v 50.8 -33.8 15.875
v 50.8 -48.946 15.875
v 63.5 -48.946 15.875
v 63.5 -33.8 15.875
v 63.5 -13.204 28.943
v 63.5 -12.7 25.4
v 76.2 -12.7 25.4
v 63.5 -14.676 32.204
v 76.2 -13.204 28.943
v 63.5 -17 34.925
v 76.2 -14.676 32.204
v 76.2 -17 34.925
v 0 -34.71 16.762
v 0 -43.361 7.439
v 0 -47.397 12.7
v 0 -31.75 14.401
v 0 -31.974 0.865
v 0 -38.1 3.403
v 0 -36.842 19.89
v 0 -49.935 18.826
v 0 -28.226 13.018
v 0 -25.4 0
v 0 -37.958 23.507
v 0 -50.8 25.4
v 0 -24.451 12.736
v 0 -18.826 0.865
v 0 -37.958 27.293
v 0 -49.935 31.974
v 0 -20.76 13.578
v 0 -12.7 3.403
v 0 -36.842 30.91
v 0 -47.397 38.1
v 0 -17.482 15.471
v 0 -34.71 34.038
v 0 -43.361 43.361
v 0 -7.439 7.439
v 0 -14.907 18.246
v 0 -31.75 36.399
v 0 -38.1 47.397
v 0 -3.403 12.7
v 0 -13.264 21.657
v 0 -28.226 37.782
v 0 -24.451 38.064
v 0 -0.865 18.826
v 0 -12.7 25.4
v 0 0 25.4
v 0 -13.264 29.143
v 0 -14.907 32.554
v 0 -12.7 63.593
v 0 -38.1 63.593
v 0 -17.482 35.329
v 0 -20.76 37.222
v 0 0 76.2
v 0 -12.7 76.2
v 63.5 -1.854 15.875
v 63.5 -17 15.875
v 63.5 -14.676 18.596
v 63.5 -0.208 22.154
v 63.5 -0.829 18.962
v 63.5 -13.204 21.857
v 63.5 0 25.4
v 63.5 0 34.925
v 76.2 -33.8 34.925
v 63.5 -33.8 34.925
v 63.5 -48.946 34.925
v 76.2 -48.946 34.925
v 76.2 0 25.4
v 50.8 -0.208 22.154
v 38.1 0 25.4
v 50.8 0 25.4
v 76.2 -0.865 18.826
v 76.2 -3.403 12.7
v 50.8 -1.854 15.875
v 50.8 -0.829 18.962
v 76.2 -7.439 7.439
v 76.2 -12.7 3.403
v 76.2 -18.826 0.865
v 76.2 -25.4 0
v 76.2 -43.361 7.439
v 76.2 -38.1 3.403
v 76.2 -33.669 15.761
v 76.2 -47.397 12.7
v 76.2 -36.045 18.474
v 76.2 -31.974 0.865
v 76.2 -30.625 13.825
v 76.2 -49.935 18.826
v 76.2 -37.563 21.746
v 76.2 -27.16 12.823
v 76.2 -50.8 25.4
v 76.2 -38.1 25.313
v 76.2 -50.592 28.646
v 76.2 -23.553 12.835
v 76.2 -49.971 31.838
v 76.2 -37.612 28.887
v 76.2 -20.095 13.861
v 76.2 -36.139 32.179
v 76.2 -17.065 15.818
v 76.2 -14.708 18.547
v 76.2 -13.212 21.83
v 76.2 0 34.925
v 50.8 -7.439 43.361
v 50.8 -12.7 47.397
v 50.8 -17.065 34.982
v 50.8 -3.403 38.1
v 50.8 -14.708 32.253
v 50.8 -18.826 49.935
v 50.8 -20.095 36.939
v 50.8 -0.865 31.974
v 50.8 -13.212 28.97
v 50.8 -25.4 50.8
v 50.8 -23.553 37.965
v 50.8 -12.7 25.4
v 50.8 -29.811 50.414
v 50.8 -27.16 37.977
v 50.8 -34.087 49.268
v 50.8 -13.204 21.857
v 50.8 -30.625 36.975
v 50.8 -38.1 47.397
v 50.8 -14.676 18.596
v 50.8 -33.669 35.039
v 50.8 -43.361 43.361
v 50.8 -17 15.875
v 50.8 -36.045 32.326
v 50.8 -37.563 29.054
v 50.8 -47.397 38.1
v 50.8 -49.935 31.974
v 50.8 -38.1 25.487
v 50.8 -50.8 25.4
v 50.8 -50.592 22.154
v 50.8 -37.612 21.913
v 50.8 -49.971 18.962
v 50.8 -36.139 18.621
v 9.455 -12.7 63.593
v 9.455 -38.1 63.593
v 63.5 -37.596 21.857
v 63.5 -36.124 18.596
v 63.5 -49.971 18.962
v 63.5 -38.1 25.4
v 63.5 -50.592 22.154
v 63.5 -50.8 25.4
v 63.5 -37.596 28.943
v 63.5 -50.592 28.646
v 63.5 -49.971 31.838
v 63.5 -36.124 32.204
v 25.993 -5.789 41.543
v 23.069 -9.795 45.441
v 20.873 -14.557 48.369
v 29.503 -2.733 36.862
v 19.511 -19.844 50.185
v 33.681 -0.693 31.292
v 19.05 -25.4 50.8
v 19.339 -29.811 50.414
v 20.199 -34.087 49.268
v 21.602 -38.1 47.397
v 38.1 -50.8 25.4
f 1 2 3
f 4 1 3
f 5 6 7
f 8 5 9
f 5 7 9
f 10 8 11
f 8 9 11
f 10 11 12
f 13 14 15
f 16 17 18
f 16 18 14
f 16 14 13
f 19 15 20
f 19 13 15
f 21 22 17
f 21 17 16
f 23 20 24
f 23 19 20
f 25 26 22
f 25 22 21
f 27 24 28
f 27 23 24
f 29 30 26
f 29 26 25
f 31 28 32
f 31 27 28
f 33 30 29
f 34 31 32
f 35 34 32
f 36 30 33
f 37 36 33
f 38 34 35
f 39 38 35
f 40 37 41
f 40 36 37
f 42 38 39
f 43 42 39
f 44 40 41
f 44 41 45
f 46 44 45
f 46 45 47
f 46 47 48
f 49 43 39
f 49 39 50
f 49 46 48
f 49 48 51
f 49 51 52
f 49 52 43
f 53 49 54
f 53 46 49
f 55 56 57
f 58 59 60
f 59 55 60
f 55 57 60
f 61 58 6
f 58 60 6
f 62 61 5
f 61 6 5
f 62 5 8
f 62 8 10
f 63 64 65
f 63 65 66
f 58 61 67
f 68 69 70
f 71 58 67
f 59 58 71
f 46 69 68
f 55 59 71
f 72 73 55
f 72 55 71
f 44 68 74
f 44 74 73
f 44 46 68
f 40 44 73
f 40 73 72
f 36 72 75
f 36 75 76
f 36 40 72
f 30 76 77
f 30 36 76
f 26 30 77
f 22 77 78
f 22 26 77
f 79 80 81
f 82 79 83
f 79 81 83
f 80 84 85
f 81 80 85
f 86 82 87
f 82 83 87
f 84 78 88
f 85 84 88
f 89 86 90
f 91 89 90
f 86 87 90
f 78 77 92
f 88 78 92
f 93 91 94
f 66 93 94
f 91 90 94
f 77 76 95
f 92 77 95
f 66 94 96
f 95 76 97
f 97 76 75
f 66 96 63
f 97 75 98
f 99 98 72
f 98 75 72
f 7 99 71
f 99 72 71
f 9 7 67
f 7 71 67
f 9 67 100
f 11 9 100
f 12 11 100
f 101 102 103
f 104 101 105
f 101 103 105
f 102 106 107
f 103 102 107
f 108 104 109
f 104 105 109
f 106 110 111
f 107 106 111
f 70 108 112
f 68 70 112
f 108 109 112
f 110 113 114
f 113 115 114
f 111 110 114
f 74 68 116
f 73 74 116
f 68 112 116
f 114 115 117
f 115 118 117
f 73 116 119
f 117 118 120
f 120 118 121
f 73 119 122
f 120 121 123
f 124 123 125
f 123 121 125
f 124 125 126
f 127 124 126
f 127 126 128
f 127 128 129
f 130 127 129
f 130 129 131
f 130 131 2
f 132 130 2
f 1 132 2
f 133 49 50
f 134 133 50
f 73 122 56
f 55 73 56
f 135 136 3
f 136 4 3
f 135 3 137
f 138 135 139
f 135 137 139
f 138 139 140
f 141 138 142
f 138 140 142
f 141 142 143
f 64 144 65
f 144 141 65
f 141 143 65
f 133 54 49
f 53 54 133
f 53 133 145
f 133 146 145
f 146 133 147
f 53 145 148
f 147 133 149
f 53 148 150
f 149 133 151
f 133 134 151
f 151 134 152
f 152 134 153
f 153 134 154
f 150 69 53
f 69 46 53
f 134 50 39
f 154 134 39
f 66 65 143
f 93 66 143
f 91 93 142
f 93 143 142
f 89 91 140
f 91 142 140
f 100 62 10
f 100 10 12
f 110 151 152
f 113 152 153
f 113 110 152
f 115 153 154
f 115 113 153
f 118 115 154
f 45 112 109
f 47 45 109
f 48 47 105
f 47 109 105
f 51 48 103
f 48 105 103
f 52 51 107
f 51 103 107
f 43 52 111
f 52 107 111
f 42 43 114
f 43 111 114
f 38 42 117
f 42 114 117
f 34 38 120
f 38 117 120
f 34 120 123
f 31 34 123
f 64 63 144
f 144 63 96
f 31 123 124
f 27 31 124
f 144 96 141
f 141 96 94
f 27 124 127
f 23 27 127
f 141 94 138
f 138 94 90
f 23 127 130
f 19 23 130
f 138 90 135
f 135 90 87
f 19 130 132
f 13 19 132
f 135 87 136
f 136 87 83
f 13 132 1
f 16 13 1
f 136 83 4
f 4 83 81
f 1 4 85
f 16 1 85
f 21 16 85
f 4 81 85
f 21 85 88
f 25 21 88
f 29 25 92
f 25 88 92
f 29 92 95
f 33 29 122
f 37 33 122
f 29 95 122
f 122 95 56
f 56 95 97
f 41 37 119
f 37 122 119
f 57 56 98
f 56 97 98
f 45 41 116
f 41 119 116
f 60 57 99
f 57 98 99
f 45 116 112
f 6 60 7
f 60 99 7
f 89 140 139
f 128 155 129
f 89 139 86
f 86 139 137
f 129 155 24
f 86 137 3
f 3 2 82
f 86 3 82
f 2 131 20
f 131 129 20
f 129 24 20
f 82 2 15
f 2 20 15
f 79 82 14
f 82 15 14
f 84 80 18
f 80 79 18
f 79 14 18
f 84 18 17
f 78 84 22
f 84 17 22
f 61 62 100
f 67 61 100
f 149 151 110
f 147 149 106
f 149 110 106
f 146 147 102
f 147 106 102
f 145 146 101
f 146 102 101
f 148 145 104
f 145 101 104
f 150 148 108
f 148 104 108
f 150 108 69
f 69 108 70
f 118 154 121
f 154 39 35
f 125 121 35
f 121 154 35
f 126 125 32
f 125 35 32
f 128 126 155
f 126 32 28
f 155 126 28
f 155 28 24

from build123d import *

# Parameters (mm, degrees)
F0_W         = 76.2
F0_H         = 76.2
F1_DEPTH     = 50.8
F2_R         = 12.7
F3_DEPTH     = 76.201
F5_DEPTH     = 25.4
F6_DEPTH     = 50.801
F7_R         = 25.39999
F9_DEPTH     = 25.4
F10_DEPTH    = 76.201
F11_T1_DEPTH = 203.2


# Not quite as in the source:
# - a fillet or chamfer that OpenCascade refuses, or shapes differently, is made with other operations: its cross-section is extruded or revolved along the edge and cut away or added
# - a fillet or chamfer is up to 0.001 mm smaller than in the source, because OpenCascade refuses the exact size


with BuildPart() as f1:
    # F0 (on Front) → F1 (new body)
    with BuildSketch(Plane.XZ):
        with Locations((38.1, 38.1)):
            Rectangle(F0_W, F0_H)
    extrude(amount=F1_DEPTH)

    # F2 (on face) → F3 (cut, through all)
    with BuildSketch(Plane.YZ.offset(76.2)):
        with Locations((-25.4, 25.4)):
            Circle(F2_R)
    extrude(amount=-F3_DEPTH, mode=Mode.SUBTRACT)

    # F4 (on face) → F5 (cut)
    with BuildSketch(Plane.XZ.offset(50.8)):
        Polygon((63.5, 34.925), (76.2, 34.925), (76.2, 76.2), (0, 76.2), (19.05, 50.8), (50.8, 50.8), (50.8, 15.875), (63.5, 15.875), align=None)
    extrude(amount=-F5_DEPTH, mode=Mode.SUBTRACT)

    # F4 (on face) → F6 (cut, through all)
    with BuildSketch(Plane.XZ.offset(50.8)):
        Polygon((63.5, 34.925), (76.2, 34.925), (76.2, 76.2), (0, 76.2), (19.05, 50.8), (50.8, 50.8), (50.8, 15.875), (63.5, 15.875), align=None)
    extrude(amount=-F6_DEPTH, mode=Mode.SUBTRACT)

    # F7 (radius 25.4 in the source; OpenCascade refuses exactly that, so slightly less here)
    f7_edges = [f1.edges().sort_by_distance(p)[0] for p in [
        (34.925, -50.8, 50.8),
        (34.925, 0, 50.8),
    ]]
    fillet(f7_edges, radius=F7_R)

    # F8 (on face) → F9 (cut)
    with BuildSketch(Plane(origin=(0, 0, 0), x_dir=(0, -1, 0), z_dir=(-1, 0, 0))):
        with BuildLine():
            Line((50.8, 76.2), (12.7, 76.2))
            Line((12.7, 76.2), (12.7, 63.5934035911))
            Line((12.7, 63.5934035911), (38.1, 63.5934035911))
            Line((38.1, 63.5934035911), (38.1, 47.3970452561))
            ThreePointArc((38.1, 47.3970452561), (47.3970452561, 38.1), (50.8, 25.4))
            Line((50.8, 25.4), (50.8, 76.2))
        make_face()
    extrude(amount=-F9_DEPTH, mode=Mode.SUBTRACT)

    # F8 (on face) → F10 (cut, through all)
    with BuildSketch(Plane(origin=(0, 0, 0), x_dir=(0, -1, 0), z_dir=(-1, 0, 0))):
        with BuildLine():
            Line((50.8, 76.2), (12.7, 76.2))
            Line((12.7, 76.2), (12.7, 63.5934035911))
            Line((12.7, 63.5934035911), (38.1, 63.5934035911))
            Line((38.1, 63.5934035911), (38.1, 47.3970452561))
            ThreePointArc((38.1, 47.3970452561), (47.3970452561, 38.1), (50.8, 25.4))
            Line((50.8, 25.4), (50.8, 76.2))
        make_face()
    extrude(amount=-F10_DEPTH, mode=Mode.SUBTRACT)

    # F11: fillet of radius 25.4 on 2 edges, made by hand

    # F11_s2 → F11_t1 (cut)
    with BuildSketch(Plane.YZ.offset(-63.5)):
        with BuildLine():
            ThreePointArc((-50.8, 25.4), (-43.3605122421, 7.4394877579), (-25.4, 0))
            Line((-25.4, 0), (-50.8, 0))
            Line((-50.8, 0), (-50.8, 25.4))
        make_face()
        with BuildLine():
            ThreePointArc((0, 25.4), (-7.4394877579, 7.4394877579), (-25.4, 0))
            Line((-25.4, 0), (0, 0))
            Line((0, 0), (0, 25.4))
        make_face()
    extrude(amount=F11_T1_DEPTH, mode=Mode.SUBTRACT)


solid = f1.part
